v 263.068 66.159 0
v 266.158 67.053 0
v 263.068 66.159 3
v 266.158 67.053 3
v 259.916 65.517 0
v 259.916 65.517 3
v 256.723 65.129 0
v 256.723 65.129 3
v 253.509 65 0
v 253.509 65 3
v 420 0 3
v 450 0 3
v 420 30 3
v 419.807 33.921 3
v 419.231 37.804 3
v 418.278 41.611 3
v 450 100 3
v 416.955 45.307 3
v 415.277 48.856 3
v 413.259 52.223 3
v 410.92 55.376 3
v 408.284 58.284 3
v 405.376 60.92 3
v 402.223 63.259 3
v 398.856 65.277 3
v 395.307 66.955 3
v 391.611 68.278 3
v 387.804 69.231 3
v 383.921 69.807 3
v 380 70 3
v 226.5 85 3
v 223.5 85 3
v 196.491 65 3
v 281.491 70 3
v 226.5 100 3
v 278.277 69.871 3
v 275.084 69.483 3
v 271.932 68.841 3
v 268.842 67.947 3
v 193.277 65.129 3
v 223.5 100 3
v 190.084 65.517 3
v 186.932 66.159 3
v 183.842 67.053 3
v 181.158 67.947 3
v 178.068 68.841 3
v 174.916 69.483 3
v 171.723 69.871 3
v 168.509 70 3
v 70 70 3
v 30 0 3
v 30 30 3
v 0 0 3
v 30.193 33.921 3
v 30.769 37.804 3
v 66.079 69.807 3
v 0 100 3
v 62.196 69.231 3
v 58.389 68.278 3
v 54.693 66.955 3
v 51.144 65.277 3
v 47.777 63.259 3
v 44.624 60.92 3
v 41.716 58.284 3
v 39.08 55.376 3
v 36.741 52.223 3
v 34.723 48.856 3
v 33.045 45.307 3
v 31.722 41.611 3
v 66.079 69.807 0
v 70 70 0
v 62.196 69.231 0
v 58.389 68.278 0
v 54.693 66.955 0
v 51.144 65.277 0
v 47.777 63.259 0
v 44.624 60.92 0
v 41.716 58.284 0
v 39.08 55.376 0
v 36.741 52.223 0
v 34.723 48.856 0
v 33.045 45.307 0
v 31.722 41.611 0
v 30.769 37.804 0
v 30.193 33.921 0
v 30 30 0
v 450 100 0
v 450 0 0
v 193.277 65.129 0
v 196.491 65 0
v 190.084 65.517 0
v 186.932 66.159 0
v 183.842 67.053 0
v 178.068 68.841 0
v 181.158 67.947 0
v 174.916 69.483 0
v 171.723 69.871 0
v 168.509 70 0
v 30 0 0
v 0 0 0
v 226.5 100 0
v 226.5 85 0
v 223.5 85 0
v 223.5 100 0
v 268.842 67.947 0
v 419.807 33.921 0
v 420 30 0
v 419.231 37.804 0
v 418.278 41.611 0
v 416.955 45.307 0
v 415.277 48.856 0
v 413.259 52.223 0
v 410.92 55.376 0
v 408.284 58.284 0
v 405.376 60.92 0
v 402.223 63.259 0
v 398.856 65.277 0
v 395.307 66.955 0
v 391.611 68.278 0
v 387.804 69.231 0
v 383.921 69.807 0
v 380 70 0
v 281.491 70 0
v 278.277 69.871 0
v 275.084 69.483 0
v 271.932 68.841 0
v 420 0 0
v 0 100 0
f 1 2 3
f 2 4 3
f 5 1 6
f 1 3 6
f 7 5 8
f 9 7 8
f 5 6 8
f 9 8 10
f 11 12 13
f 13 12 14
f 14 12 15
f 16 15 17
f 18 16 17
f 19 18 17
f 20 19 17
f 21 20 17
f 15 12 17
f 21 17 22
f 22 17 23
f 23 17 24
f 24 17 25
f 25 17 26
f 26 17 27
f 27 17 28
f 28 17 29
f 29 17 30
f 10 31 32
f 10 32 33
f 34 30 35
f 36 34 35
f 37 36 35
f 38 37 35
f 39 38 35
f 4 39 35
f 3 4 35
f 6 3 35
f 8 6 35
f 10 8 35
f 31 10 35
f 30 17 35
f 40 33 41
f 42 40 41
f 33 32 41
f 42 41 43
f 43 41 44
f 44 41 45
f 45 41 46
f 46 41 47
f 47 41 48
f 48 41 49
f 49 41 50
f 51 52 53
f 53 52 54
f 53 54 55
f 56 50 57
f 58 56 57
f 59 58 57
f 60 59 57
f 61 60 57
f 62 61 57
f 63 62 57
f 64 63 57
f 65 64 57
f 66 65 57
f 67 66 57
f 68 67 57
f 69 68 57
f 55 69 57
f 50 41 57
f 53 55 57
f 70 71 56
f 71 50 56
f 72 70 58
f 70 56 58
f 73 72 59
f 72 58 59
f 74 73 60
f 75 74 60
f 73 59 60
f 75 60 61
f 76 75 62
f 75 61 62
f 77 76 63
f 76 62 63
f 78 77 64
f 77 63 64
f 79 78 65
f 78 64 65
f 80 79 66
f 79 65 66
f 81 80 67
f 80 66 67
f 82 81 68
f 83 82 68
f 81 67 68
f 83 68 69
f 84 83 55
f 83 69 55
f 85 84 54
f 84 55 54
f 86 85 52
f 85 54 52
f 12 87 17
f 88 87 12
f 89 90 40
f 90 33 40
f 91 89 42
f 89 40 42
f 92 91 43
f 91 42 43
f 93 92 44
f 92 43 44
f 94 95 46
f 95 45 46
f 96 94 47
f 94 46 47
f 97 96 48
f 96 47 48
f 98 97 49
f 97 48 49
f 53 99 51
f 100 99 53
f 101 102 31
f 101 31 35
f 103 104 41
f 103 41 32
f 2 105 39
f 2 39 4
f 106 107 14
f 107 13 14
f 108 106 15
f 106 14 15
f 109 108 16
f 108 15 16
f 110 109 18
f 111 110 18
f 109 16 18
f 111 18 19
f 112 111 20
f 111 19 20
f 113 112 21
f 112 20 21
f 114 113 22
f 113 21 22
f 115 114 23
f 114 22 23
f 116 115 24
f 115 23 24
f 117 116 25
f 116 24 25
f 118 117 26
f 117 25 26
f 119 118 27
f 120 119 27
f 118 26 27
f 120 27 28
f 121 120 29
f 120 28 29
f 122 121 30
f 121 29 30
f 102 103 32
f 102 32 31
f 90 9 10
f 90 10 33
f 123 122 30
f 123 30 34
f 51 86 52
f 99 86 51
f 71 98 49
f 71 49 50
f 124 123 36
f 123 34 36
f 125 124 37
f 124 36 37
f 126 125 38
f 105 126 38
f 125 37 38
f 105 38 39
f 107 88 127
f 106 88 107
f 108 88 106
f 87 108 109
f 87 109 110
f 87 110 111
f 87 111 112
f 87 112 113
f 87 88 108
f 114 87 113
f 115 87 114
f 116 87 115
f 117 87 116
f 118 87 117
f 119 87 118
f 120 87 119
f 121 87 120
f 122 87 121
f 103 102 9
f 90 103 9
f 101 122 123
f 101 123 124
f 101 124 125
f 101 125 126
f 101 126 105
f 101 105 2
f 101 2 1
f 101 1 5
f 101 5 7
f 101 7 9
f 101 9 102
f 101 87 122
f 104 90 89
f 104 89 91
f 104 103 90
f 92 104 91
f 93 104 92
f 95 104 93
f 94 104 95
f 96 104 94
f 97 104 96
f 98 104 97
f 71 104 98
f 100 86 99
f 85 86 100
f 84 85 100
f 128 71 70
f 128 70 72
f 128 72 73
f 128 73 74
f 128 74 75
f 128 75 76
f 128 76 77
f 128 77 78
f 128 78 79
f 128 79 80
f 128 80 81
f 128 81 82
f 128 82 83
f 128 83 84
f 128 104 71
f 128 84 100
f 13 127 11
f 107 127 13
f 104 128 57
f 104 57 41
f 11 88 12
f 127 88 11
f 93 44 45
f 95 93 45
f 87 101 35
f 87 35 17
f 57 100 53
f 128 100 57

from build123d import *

# Parameters (mm, degrees)
BOSS_EXTRUDE1_DEPTH = 3
FILLET1_R           = 40


with BuildPart() as part:
    # Sketch1 → Boss-Extrude1 (new body)
    with BuildSketch(Plane.XY):
        Polygon((0, 0), (0, 100), (223.5, 100), (223.5, 85), (226.5, 85), (226.5, 100), (450, 100), (450, 0), (420, 0), (420, 70), (275, 70), (260, 65), (190, 65), (175, 70), (30, 70), (30, 0), align=None)
    extrude(amount=BOSS_EXTRUDE1_DEPTH)

    # Fillet1
    fillet1_edges = [part.edges().sort_by_distance(p)[0] for p in [
        (420, 70, 1.5),
        (275, 70, 1.5),
        (260, 65, 1.5),
        (190, 65, 1.5),
        (175, 70, 1.5),
        (30, 70, 1.5),
    ]]
    fillet(fillet1_edges, radius=FILLET1_R)


solid = part.part
